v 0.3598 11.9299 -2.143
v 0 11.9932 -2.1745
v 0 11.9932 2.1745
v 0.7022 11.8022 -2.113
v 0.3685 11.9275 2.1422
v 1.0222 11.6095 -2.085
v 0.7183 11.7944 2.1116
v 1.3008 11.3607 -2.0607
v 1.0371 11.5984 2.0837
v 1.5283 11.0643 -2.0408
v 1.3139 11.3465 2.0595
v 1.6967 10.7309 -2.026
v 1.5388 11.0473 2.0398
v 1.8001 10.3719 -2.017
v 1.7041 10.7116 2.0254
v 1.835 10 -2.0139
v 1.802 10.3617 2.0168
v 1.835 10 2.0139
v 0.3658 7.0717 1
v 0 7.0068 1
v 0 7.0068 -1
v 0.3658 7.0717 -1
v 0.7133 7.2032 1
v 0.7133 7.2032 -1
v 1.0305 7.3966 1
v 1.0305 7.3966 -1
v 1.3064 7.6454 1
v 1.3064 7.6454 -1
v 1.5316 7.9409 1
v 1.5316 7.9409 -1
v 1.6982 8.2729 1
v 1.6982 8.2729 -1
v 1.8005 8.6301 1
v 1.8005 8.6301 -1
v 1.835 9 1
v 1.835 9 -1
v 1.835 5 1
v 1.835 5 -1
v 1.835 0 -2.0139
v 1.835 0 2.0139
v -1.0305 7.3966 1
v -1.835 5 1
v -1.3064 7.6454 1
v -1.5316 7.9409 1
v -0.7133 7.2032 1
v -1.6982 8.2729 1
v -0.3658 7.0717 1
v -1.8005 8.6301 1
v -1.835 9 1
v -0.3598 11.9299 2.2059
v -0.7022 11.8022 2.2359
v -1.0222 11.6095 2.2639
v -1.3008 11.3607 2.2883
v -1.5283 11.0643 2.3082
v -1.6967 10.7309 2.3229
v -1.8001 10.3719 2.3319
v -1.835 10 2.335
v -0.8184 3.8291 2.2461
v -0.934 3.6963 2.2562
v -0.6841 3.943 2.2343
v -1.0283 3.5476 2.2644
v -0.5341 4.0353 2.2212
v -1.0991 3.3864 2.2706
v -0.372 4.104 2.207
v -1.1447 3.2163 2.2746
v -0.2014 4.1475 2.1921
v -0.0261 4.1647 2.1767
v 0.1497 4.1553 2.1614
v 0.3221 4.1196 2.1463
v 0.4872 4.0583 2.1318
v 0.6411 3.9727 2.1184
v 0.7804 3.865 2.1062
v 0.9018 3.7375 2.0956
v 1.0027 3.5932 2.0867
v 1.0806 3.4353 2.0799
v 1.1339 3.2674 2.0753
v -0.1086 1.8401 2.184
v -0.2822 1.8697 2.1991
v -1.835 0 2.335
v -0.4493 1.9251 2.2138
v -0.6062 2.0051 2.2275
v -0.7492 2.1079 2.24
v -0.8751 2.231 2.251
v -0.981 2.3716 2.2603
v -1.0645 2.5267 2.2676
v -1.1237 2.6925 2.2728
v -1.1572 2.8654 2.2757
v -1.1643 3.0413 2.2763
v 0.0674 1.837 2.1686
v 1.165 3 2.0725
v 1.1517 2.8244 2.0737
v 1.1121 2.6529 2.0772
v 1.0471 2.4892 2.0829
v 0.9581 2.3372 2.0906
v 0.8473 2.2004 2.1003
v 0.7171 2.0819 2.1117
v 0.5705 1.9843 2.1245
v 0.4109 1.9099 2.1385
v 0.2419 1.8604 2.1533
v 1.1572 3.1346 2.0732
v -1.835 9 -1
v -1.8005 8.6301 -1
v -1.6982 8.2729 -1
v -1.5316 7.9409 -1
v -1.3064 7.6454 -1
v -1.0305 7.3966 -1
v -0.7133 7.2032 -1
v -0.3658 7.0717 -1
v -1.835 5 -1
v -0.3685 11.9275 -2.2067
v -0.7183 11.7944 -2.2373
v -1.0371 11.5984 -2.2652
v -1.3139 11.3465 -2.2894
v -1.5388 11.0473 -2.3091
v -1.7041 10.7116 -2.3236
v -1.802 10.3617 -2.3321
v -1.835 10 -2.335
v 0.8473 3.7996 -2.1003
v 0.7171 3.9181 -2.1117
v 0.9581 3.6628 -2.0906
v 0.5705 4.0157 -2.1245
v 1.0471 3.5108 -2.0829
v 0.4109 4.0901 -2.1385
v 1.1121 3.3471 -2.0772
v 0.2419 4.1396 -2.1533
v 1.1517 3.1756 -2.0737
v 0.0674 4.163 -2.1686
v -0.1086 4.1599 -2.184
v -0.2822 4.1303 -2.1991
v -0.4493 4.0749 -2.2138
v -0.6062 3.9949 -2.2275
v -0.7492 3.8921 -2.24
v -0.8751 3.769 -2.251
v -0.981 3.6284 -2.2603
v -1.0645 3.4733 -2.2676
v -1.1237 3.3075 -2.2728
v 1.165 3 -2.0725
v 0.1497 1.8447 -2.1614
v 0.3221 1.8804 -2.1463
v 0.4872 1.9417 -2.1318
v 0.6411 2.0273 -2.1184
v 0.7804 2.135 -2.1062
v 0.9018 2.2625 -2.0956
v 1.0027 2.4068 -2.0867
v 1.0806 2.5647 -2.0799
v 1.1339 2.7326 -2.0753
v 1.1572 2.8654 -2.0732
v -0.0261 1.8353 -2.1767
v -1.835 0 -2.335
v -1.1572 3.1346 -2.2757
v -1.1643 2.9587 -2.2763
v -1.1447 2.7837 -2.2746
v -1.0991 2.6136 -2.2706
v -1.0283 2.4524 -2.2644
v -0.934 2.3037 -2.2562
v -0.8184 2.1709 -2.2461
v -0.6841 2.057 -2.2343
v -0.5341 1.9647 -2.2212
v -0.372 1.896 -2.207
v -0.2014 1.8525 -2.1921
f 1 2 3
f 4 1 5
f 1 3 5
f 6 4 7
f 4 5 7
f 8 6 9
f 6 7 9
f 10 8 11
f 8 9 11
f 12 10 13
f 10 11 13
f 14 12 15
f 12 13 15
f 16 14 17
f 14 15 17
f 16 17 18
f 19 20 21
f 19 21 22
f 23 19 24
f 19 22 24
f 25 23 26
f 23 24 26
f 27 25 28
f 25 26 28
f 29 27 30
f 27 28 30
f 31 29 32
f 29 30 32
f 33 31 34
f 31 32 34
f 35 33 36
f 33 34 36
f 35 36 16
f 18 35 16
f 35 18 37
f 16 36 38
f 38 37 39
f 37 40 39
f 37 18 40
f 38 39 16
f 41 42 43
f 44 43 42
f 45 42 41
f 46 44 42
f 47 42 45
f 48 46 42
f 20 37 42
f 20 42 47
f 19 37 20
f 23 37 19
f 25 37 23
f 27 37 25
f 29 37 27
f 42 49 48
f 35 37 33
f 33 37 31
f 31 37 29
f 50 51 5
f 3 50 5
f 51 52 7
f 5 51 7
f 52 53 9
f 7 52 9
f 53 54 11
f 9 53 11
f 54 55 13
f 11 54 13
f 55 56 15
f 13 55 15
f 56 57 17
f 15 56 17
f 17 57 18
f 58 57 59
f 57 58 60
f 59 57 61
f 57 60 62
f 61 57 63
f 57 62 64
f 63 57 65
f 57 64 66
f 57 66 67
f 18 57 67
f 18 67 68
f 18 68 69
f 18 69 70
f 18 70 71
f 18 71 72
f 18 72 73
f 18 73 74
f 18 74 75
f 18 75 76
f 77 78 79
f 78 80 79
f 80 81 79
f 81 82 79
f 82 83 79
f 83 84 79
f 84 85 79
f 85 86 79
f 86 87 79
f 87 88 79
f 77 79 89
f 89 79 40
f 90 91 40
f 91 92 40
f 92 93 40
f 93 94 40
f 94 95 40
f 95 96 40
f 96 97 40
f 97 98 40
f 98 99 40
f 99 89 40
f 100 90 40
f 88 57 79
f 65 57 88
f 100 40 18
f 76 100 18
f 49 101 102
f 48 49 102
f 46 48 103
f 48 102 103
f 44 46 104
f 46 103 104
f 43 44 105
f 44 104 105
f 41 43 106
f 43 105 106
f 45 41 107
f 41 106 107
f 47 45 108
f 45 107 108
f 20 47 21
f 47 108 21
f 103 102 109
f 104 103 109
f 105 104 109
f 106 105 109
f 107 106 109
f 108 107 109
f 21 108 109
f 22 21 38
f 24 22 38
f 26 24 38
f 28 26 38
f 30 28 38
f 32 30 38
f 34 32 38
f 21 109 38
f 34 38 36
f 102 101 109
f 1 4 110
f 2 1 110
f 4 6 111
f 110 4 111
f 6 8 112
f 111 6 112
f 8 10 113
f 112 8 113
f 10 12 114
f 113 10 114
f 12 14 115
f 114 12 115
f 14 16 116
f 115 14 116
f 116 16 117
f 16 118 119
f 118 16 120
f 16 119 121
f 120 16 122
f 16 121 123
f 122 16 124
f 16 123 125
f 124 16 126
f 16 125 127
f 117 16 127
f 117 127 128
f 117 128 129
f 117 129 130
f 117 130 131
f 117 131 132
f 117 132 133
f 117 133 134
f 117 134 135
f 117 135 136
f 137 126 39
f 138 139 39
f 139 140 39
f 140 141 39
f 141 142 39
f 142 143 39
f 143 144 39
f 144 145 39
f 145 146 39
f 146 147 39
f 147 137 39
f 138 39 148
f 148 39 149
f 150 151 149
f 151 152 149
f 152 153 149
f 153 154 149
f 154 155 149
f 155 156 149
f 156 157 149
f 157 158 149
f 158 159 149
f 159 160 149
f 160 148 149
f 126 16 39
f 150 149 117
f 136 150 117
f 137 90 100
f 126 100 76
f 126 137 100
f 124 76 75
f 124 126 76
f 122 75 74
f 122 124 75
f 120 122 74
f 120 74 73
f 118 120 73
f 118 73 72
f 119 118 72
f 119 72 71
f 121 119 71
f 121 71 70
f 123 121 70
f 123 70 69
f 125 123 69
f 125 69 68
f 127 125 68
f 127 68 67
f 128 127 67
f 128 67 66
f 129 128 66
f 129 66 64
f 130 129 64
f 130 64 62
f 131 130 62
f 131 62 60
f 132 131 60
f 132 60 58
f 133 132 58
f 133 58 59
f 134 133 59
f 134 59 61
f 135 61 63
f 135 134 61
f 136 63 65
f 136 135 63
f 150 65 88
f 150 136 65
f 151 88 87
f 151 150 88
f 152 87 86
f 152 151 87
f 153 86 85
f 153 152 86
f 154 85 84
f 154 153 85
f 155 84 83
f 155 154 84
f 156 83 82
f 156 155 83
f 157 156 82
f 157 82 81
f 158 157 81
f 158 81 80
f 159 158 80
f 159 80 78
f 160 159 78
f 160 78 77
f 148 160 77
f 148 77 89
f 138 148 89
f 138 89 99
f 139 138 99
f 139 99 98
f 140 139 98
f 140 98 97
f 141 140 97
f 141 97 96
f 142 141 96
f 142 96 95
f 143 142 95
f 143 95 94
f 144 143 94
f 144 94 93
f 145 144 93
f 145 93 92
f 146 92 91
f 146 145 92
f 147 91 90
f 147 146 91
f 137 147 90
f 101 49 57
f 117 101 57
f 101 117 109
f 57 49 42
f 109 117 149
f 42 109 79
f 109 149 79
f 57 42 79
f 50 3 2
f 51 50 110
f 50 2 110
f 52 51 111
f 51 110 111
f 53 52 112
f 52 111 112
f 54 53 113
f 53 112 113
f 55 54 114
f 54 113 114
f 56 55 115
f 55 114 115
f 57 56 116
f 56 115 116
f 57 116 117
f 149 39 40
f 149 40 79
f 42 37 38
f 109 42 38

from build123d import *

# Parameters (mm, degrees)
BOSS_EXTRUDE1_DEPTH     = 10
BOSS_EXTRUDE2_DEPTH     = 2
SKETCH4_W               = 2
SKETCH4_H               = 2
CUT_EXTRUDE1_DEPTH      = 3.67
FILLET1_R               = 2
CUT_EXTRUDE2_DEPTH      = 13.355398317
CUT_EXTRUDE2_DEPTH_BACK = 13.355398317
SKETCH6_R               = 1.165


with BuildPart() as part:
    # Sketch2 → Boss-Extrude1 (new body)
    with BuildSketch(Plane(origin=(0, 0, 0), x_dir=(1, 0, 0), z_dir=(0, 1, 0))):
        Polygon((-1.835, -2.335), (-1.835, 2.335), (1.835, 2.013916605), (1.835, -2.013916605), align=None)
    extrude(amount=BOSS_EXTRUDE1_DEPTH)

    # Sketch3 → Boss-Extrude2 (add)
    with BuildSketch(Plane(origin=(0, 10, 0), x_dir=(1, 0, 0), z_dir=(0, 1, 0))):
        Polygon((1.835, -2.013916605), (1.835, 2.013916605), (-1.835, 2.335), (-1.835, -2.335), align=None)
    extrude(amount=BOSS_EXTRUDE2_DEPTH)

    # Sketch4 → Cut-Extrude1 (cut)
    with BuildSketch(Plane(origin=(1.835, 0, 0), x_dir=(0, 0, -1), z_dir=(1, 0, 0))):
        with Locations((0, 6)):
            Rectangle(SKETCH4_W, SKETCH4_H)
    extrude(amount=-CUT_EXTRUDE1_DEPTH, mode=Mode.SUBTRACT)

    # Fillet1
    # the kernel refuses this fillet: 2 mm, written as the material it takes off along each edge
    with BuildSketch(Plane(origin=(1.835, 12, 7.013916605), x_dir=(-1, 0, 0), z_dir=(0, 0, -1))) as fillet1_piece_1:
        with BuildLine():
            CenterArc((FILLET1_R, -FILLET1_R), FILLET1_R, 90, 90)
            Line((0, -FILLET1_R), (0, 0))
            Line((0, 0), (FILLET1_R, 0))
        make_face()
    extrude(amount=14.02783321, mode=Mode.SUBTRACT)
    with BuildSketch(Plane(origin=(-1.835, 12, -7.335), x_dir=(0, -1, 0), z_dir=(0, 0, 1))) as fillet1_piece_2:
        with BuildLine():
            CenterArc((FILLET1_R, FILLET1_R), FILLET1_R, 180, 90)
            Line((0, FILLET1_R), (0, 0))
            Line((0, 0), (FILLET1_R, 0))
        make_face()
    extrude(amount=14.67, mode=Mode.SUBTRACT)
    with BuildSketch(Plane(origin=(-1.835, 7, -1), x_dir=(0, 1, 0), z_dir=(0, 0, 1)), Plane(origin=(1.835, 7, -1), x_dir=(-1, 0, 0), z_dir=(0, 0, 1))) as fillet1_piece_3:
        with BuildLine():
            CenterArc((FILLET1_R, -FILLET1_R), FILLET1_R, 90, 90)
            Line((0, -FILLET1_R), (0, 0))
            Line((0, 0), (FILLET1_R, 0))
        make_face()
    extrude(amount=2, mode=Mode.SUBTRACT)

    # Sketch6 → Cut-Extrude2 (cut, two sides: drawn at the far end of the back side and taken through both)
    with BuildSketch(Plane.XY.offset(-CUT_EXTRUDE2_DEPTH_BACK)):
        with Locations((0, 3)):
            Circle(SKETCH6_R)
    extrude(amount=CUT_EXTRUDE2_DEPTH + CUT_EXTRUDE2_DEPTH_BACK, mode=Mode.SUBTRACT)


solid = part.part
